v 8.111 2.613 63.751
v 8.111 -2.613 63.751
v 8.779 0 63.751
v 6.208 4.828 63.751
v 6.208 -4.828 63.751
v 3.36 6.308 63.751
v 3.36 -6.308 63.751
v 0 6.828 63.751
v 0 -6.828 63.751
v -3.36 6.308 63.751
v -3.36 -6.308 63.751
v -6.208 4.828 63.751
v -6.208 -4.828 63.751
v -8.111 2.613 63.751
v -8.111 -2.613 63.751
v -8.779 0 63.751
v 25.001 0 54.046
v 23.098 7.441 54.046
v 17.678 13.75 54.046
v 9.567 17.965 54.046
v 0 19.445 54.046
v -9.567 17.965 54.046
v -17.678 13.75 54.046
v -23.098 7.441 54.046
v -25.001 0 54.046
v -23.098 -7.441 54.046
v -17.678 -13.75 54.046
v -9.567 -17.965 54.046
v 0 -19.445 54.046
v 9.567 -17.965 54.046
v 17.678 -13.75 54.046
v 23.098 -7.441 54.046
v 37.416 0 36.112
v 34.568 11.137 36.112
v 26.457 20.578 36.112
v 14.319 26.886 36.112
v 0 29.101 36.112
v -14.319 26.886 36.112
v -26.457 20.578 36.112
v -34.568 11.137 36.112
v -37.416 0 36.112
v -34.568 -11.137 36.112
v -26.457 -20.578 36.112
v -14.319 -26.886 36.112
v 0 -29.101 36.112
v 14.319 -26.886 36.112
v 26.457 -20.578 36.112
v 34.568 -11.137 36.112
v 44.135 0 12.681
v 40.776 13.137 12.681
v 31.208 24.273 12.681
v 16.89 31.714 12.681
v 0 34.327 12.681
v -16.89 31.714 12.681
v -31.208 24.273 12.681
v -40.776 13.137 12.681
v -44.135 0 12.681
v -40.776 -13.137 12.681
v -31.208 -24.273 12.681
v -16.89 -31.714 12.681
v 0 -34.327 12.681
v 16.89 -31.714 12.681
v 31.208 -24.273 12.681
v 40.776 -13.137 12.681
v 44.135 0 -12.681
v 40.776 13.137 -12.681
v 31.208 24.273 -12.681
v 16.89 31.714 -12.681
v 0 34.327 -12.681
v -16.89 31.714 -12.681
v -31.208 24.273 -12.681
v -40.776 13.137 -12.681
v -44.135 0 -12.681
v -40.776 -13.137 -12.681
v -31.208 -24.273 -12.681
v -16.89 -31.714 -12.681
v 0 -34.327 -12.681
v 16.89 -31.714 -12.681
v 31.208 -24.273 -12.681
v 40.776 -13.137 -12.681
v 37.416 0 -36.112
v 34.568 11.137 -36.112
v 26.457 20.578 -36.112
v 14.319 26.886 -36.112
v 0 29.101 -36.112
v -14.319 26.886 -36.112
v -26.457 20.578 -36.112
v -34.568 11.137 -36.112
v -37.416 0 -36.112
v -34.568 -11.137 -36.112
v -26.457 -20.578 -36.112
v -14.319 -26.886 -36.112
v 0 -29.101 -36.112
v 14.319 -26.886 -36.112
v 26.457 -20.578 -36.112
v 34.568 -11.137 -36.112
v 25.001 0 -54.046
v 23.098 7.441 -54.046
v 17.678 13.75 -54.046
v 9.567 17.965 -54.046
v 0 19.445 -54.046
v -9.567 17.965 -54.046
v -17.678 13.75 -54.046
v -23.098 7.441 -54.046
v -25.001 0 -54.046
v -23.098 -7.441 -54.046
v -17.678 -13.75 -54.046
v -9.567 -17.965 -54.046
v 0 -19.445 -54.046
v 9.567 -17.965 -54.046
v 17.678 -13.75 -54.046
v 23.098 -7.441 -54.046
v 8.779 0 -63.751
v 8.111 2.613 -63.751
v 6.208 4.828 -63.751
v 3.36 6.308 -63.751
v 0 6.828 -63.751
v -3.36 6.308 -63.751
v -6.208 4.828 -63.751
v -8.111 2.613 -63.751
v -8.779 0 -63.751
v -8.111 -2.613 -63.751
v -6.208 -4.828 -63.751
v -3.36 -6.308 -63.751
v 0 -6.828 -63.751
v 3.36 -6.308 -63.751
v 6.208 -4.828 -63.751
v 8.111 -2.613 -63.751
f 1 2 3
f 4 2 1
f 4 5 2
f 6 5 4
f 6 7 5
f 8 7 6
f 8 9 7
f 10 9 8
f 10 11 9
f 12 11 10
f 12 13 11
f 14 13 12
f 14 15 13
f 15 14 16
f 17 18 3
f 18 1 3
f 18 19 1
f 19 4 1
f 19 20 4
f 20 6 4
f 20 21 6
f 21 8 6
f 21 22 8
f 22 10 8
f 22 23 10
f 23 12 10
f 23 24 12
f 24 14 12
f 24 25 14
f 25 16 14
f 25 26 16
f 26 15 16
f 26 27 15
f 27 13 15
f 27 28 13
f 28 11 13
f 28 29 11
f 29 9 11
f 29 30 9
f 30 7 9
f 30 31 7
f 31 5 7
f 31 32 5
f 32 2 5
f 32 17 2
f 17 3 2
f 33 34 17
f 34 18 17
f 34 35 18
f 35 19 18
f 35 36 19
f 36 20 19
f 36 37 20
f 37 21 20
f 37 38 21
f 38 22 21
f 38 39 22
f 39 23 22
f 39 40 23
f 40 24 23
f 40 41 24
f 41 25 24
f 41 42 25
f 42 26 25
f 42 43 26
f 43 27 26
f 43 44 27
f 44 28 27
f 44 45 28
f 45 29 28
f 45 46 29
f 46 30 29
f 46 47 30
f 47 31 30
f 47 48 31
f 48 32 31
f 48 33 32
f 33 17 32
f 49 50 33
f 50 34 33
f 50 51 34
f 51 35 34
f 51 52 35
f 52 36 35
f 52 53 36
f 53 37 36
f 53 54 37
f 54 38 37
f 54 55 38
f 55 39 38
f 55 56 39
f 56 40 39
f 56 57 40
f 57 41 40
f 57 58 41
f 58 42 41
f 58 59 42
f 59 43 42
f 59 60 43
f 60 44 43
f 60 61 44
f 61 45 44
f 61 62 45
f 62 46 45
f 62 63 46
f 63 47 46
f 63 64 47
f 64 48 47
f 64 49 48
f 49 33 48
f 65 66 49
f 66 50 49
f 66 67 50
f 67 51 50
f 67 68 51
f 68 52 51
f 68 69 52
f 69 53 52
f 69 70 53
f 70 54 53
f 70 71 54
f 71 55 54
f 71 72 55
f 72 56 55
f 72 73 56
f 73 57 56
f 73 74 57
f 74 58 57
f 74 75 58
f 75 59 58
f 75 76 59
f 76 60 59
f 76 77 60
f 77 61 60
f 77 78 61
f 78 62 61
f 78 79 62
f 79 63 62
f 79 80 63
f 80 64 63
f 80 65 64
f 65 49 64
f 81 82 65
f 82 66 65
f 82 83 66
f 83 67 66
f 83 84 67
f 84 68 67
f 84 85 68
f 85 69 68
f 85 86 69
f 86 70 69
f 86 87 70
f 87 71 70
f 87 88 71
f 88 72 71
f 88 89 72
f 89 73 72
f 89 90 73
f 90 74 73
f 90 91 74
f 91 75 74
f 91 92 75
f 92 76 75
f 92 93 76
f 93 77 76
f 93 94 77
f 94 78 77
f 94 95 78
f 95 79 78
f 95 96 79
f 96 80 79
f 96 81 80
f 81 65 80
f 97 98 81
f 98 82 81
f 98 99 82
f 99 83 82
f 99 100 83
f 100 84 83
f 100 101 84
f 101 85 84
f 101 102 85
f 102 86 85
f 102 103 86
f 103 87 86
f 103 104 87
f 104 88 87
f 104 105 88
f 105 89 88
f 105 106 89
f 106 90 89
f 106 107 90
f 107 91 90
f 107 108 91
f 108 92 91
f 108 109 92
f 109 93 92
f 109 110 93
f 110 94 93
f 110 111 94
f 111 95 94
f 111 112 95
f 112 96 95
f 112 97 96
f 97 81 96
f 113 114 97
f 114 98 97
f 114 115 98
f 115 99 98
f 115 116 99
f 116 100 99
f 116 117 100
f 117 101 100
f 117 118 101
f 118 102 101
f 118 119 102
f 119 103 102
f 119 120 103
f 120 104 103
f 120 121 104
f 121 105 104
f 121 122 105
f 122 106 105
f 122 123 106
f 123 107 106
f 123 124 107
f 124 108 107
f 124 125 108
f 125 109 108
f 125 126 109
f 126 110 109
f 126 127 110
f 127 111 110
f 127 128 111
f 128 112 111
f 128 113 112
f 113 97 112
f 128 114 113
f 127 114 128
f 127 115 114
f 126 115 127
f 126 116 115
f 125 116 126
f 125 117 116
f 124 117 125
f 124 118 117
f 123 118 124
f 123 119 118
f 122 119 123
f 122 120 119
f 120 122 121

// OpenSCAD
// Generated by SolidPython 1.0.1 on 2020-07-29 00:46:48


scale(v = [9, 7, 13]) {
	sphere(r = 5);
}
/***********************************************
*********      SolidPython code:      **********
************************************************
 
# import packages: SolidPython
from solid import *
from solid.utils import *
from itertools import chain, combinations, permutations


class Resize:

    def __init__(self, scad_file):
        self.scad_file = scad_file
        #self.scad_file = import_scad(scad_file)
        # cone/cylinder param:
        self.r1 = 0
        self.r2 = 0
        self.h = 0
        # rectangular prism param:
        self.w = 0
        self.l = 0
        # ellipse param:
        self.r = 0

    # import OpenScad code (file name corresponds to shape)


    # classify shape + parameters
    def assign(self, param1, param2, param3):
        if self.scad_file == 'cone.scad':
            self.r1 = param1
            self.r2 = param2
            self.h = param3
        elif self.scad_file == 'cylinder.scad':
            self.r1 = param1
            self.r2 = param2
            self.h = param3
        elif self.scad_file == 'rectangularPrism.scad':
            self.h = param1
            self.l = param2
            self.w = param3
        else:
            self.r = param1
            self.h = param2

    # resize parameters
    def iterate(self):
        x = range(3, 20, 2)
        i = 1
        if self.scad_file == 'cone.scad':
            tempList = list(permutations(x, 2))
            for temp in tempList:
                param1 = temp[0]
                param2 = temp[1]
                filepath = 'produced_scad_files/' + 'cone' + str(param1) + '_' + str(param2) + '_' + '.scad'
                scad_render_to_file(cylinder(h=param1, r1=param2, r2=0), filepath)

        elif self.scad_file == 'cylinder.scad':
            tempList = list(permutations(x, 3))
            for temp in tempList:
                param1 = temp[0]
                param2 = temp[1]
                filepath = 'produced_scad_files/' + 'cylinder' + str(param1) + '_' + str(param2) + '_' + '.scad'
                scad_render_to_file(cylinder(h=param1, r1=param2, r2=param2), filepath)

        elif self.scad_file == 'rectangularPrism.scad':
            tempList = list(permutations(x, 3))
            for temp in tempList:
                param1 = temp[0]
                param2 = temp[1]
                param3 = temp[2]
                filepath = 'produced_scad_files/' + 'rectangularPrism' + str(param1) + '_' + str(param2) + '_' + str(
                    param3) + '.scad'
                scad_render_to_file(cube(size=(param1, param2, param3)), filepath)

        elif self.scad_file == 'ellipse.scad':
            tempList = list(permutations(x, 4))
            for temp in tempList:
                param1 = temp[0]
                param2 = temp[1]
                param3 = temp[2]
                param4 = temp[3]
                filepath = 'produced_scad_files/' + 'ellipse' + str(param1) + '_' + str(param2) + '_' + str(param3) + '_' + str(param4) + '.scad'
                scad_render_to_file(scale([param1, param2, param3])(sphere(r=param4)), filepath)

    def render_to_scadfile(self):
        scad_render_to_file(scad, 'example.scad') 
 
************************************************/
